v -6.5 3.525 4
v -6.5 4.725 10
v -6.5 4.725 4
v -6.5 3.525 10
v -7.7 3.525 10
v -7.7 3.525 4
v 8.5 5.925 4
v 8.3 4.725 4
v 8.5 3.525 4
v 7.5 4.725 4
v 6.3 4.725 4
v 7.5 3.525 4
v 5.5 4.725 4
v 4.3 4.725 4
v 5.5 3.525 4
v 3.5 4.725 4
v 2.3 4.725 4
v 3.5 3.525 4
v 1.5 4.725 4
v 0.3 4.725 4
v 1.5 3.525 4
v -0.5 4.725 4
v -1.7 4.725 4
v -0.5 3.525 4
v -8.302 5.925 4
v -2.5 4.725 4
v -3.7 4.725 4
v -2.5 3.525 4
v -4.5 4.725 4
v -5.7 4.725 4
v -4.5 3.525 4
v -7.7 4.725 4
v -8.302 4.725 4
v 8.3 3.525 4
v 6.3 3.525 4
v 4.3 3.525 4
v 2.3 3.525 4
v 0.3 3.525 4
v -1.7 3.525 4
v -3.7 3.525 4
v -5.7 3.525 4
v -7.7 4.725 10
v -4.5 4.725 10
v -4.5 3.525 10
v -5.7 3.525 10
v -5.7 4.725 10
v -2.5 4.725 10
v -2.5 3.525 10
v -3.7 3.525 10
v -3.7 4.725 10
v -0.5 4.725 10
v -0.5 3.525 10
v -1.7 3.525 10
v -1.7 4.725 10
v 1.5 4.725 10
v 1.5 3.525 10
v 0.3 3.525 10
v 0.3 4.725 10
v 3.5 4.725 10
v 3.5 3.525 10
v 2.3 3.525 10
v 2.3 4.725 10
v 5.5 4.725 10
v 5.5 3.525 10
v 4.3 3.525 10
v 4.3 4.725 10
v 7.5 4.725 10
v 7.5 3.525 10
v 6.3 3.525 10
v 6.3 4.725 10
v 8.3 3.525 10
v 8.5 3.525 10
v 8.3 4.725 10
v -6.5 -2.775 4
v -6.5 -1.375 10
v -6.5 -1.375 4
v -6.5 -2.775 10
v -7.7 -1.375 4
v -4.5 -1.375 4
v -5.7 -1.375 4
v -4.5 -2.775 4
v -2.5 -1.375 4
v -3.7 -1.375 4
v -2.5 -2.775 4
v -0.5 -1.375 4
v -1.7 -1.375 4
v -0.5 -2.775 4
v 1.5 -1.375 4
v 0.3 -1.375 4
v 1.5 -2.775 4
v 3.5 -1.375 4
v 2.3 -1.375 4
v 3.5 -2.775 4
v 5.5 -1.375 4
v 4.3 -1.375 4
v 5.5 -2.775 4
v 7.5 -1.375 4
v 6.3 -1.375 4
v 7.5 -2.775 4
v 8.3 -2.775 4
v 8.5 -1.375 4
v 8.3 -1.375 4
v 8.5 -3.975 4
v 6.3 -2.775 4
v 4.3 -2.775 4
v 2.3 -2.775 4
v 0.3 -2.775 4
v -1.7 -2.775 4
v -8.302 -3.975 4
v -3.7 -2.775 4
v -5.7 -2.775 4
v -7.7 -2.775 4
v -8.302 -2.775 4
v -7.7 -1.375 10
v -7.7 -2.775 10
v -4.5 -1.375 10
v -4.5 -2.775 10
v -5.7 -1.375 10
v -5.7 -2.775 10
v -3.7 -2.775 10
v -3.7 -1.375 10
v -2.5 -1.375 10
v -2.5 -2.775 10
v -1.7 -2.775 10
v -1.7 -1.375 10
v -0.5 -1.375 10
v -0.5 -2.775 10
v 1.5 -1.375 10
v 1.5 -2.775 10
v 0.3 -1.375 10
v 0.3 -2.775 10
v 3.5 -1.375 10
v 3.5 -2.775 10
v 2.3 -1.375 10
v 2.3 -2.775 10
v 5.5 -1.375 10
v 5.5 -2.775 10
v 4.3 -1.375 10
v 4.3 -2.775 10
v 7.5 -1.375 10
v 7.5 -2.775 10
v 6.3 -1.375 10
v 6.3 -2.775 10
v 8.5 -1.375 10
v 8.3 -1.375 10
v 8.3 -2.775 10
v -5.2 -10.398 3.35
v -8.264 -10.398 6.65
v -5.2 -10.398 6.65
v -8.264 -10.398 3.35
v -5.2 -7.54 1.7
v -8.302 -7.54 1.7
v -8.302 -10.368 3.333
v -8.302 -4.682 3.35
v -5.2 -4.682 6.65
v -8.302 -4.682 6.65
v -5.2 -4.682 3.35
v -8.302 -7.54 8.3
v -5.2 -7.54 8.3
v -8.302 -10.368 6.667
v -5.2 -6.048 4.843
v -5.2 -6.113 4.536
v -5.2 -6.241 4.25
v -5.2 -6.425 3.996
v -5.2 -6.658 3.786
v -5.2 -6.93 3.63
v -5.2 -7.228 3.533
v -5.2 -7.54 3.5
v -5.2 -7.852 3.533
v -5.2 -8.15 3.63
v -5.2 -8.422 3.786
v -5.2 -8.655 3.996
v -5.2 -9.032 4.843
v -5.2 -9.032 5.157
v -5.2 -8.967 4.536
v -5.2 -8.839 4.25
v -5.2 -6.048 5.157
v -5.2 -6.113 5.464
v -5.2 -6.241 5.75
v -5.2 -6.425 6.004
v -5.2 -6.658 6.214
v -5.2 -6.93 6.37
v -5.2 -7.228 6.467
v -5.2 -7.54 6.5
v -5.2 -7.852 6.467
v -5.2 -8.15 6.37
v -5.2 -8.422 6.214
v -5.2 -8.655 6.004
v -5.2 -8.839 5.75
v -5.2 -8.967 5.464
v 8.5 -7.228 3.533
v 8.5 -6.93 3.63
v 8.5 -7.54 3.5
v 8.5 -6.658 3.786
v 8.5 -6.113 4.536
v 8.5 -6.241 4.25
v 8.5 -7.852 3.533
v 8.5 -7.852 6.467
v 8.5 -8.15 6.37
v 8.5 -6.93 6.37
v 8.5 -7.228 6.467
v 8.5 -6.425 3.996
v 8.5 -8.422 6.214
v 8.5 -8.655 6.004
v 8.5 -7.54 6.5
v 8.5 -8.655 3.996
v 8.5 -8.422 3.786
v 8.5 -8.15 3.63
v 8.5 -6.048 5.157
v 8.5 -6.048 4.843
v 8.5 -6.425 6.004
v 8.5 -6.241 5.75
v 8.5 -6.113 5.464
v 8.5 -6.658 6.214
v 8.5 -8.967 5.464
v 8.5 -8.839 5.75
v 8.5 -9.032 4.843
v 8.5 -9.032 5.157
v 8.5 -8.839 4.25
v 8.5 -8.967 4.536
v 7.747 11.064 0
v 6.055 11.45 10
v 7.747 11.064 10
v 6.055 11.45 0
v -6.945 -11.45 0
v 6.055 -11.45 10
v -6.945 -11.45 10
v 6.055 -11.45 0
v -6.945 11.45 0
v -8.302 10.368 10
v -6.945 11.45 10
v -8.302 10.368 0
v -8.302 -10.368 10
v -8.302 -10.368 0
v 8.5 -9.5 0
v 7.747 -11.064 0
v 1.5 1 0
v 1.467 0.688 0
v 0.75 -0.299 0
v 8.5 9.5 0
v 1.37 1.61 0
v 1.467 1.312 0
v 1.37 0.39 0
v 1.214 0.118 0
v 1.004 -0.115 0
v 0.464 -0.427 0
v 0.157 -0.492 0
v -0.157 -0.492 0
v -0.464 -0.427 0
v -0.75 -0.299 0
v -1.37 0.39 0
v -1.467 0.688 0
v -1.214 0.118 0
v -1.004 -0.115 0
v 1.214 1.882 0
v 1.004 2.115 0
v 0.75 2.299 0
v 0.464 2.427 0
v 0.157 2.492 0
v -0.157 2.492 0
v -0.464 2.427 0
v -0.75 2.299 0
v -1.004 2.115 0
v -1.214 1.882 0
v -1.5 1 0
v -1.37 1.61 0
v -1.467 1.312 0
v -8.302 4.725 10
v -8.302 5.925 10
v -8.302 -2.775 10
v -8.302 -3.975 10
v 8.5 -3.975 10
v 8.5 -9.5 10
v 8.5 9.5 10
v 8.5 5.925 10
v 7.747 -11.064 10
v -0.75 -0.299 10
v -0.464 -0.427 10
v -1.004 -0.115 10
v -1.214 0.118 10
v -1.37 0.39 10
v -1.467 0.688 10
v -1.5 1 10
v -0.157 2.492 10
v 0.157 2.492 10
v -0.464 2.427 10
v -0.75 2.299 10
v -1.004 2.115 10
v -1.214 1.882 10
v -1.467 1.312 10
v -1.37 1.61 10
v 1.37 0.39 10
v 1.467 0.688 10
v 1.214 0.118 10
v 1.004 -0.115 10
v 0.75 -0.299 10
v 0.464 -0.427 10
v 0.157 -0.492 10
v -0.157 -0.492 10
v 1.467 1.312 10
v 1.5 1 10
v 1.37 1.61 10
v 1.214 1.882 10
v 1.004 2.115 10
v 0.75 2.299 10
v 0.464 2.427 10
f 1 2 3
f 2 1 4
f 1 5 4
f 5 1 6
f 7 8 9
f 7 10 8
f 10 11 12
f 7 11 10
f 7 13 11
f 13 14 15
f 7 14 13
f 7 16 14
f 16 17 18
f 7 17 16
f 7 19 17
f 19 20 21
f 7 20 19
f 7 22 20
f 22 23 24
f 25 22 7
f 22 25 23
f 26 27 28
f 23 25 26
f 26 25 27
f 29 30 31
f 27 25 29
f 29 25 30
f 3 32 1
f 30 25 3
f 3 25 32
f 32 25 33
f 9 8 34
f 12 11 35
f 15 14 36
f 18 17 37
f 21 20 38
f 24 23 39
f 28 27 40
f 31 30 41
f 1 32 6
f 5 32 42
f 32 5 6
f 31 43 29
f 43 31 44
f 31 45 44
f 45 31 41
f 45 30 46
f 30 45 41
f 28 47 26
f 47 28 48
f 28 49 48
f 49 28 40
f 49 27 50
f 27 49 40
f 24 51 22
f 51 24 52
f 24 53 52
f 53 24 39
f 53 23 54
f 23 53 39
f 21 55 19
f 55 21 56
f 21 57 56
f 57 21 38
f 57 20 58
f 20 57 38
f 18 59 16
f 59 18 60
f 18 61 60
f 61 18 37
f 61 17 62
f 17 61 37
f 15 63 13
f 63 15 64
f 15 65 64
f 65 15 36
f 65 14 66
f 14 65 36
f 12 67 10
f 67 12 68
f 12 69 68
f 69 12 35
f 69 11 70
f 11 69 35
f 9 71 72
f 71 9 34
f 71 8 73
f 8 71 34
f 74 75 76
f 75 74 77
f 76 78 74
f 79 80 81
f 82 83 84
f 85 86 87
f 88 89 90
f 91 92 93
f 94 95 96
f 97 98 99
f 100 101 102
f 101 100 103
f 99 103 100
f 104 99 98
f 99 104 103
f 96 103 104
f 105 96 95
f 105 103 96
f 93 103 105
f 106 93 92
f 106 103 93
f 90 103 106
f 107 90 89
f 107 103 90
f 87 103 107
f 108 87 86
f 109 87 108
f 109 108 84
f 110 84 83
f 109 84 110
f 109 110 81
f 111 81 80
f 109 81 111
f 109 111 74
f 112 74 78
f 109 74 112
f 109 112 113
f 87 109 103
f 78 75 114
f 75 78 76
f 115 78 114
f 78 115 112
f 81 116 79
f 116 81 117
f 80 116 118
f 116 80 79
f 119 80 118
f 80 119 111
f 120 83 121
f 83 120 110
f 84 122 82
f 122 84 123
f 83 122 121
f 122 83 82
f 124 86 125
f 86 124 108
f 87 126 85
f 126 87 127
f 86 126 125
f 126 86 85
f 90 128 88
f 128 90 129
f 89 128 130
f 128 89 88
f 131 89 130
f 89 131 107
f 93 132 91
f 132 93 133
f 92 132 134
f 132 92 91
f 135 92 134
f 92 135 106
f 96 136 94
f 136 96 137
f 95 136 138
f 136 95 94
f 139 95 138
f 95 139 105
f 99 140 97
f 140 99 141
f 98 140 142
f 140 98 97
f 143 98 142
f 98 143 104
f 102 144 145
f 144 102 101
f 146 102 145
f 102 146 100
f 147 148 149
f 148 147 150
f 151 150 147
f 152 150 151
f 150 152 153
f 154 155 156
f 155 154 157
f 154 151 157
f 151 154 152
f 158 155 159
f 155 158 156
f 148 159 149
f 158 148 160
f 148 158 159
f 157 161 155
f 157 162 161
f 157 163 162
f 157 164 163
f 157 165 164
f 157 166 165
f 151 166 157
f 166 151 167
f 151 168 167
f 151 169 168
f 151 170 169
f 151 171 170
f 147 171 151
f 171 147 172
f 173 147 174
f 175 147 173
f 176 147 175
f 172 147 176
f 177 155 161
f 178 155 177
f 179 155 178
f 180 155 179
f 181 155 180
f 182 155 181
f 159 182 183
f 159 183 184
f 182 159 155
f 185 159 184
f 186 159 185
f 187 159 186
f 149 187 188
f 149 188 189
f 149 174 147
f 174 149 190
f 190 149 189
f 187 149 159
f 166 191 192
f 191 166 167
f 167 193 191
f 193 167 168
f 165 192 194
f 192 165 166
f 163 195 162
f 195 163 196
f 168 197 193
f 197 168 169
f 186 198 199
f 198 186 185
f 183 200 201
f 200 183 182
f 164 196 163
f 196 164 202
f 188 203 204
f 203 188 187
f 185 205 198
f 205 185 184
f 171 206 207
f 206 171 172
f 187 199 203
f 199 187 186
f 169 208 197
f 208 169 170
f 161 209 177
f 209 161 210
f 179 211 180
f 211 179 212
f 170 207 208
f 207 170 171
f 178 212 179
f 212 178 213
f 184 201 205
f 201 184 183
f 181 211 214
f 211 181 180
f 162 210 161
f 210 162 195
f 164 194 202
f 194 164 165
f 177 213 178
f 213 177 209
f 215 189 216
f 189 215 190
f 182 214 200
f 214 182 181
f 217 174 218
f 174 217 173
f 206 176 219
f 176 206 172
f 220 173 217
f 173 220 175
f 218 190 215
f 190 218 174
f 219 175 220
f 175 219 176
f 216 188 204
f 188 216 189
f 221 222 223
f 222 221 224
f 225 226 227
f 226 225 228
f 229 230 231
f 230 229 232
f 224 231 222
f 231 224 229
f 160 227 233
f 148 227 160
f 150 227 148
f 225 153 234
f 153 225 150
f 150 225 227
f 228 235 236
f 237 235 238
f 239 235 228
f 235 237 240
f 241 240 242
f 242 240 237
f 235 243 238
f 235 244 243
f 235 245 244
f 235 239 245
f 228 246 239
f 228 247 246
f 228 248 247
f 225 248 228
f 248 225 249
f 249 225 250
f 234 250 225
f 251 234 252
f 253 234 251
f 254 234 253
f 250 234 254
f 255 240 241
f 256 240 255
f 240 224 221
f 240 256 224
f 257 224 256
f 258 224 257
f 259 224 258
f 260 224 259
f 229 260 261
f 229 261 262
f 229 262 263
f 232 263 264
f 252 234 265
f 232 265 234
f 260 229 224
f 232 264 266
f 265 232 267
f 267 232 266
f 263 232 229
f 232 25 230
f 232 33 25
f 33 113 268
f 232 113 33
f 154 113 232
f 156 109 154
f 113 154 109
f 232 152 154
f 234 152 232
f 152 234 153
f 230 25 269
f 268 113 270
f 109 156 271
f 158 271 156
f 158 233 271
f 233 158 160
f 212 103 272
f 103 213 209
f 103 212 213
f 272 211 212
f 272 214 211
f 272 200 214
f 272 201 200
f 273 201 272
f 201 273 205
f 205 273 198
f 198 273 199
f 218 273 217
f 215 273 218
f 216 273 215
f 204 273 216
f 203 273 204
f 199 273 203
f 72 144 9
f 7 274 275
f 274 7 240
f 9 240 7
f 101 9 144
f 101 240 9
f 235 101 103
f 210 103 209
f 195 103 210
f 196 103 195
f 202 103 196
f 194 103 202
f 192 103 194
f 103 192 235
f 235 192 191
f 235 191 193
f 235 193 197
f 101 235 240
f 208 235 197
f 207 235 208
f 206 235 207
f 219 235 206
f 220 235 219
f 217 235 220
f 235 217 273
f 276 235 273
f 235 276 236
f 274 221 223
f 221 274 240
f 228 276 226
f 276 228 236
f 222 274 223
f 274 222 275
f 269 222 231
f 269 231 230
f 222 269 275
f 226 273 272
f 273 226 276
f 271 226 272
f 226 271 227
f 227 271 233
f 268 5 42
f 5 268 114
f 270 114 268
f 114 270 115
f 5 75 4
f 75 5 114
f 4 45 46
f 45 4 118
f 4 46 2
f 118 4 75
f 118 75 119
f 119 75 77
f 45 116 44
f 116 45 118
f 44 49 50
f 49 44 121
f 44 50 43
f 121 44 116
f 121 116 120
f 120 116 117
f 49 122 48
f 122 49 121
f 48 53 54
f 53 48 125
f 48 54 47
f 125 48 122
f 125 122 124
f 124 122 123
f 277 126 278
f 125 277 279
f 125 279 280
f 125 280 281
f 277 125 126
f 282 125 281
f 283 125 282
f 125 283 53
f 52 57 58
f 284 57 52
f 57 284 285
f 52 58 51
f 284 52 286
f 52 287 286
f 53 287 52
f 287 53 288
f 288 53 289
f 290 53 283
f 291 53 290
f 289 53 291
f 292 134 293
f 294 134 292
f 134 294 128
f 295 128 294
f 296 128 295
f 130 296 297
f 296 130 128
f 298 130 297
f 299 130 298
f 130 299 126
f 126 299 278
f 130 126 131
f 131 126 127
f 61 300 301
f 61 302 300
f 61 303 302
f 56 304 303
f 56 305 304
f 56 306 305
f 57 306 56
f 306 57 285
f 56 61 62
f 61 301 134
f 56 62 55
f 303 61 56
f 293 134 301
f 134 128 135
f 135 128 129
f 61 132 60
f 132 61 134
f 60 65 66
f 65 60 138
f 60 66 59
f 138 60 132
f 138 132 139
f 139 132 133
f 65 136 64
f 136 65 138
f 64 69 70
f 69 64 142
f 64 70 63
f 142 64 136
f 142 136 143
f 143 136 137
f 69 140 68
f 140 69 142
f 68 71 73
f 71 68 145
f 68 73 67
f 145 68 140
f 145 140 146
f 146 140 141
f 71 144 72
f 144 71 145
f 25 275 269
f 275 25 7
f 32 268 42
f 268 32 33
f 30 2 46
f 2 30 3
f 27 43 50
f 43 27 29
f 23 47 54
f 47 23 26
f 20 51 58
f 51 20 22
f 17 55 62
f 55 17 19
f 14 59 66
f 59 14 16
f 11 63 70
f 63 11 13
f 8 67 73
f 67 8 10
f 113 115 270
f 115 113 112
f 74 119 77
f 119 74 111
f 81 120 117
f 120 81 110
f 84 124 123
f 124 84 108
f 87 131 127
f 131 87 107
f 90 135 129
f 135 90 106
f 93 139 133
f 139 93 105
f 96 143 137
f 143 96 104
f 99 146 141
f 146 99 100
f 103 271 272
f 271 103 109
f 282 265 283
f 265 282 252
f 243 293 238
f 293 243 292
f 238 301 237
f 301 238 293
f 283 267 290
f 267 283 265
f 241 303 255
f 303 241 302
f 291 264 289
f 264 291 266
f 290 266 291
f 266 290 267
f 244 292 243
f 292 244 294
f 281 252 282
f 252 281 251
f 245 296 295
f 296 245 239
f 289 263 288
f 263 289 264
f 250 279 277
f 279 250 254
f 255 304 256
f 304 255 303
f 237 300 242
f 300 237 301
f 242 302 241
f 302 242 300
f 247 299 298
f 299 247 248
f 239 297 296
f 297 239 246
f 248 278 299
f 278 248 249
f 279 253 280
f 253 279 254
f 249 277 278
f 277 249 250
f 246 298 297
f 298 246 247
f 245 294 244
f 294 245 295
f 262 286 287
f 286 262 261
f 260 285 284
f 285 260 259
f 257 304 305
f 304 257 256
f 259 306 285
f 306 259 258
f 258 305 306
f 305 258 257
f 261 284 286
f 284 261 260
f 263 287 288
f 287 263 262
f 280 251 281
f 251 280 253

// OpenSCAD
// Graber i3 xy belt holder v1.0 by ValterFC
// december / 2013

// x axis not yet - sorry

// ******************************************************
// Select your belt type *NOT TESTED*
// ******************************************************
//T2.5
//belt_tooth_distance = 2.5;
//belt_tooth_ratio = 0.8;

//T5 (strongly discouraged)
//belt_tooth_distance = 5;
//belt_tooth_ratio = 1.05;

//HTD3
//belt_tooth_distance = 3;
//belt_tooth_ratio = 1.05;

//MXL
//belt_tooth_distance = 2.032;
//belt_tooth_ratio = 0.94;

//GT2
belt_tooth_distance = 2; // [2.5:T2.5, 5:T5, 3:HTD3, 2.032:MXL, 2:GT2]
belt_tooth_ratio = 0.8; // [0.8:T2.5, 1.05:T5, 1.05:HTD3, 0.94:MXL, 0.8:GT2]

//what file to generate?
make_object = 0; // [0:fixed object, 1:tensiometer object]

//side nut orientation
side_nut_orientation = 0; // [0:normal, 1:another way]

/*Non customizer variables*/
length = 17+0;
width = 10+0;
thickness = 21+0;
extra = 0.2+0;
belt_width = 6+0;
belt_thickness = 1.2+0; // Excluding teeth height (0.9)
belt_pitch = belt_tooth_distance+0;
teeth_height = 1.1+0;
teeth_width = belt_tooth_ratio+0;
screw_hole_diameter = 3+0;
nut_diameter = 5+0.8;
nut_thickness = 2.5+0;

// from thingiverse.com/thing:9347
module roundedRect(size, radius)
{
	x = size[0]-radius;
	y = size[1];
	z = size[2];
	linear_extrude(height=z)
	hull()
	{
		// place 4 circles in the corners, with the given radius
  		translate([(-x/2)+(radius/2), (-y/2)+(radius/2), 0])
			circle(r=radius);

		translate([(x/2)-(radius/2), (-y/2)+(radius/2), 0])
			circle(r=radius);

		translate([(-x/2)+(radius/2), (y/2)-(radius/2), 0])
			circle(r=radius);

		translate([(x/2)-(radius/2), (y/2)-(radius/2), 0])
			circle(r=radius);
	}
}

module sidenut() {
	//nut fitting
	if (make_object == 0) cylinder( h=nut_thickness+0.8,r=nut_diameter/2+extra*2,$fn=6 );
	//the screw cylinder
	cylinder( h=thickness+1, r=screw_hole_diameter/2, $fn=30);
}

difference()
{
	roundedRect([length,thickness,width], 2);

	//+++++++++++++++++++++++++++++++++++++++
	// belt top
	translate([-length/2,((thickness+belt_thickness+teeth_height)/4)-teeth_height,width-belt_width])
		cube([length,belt_thickness,belt_width+1]);

	// tooth top
	for( x = [0:belt_pitch:length+1] )
	{
		translate([x-length/2,((thickness+belt_thickness+teeth_height)/4),width-belt_width])
   		rotate(a=180,v=[0,0,1])
			cube(size=[belt_pitch-teeth_width,teeth_height+belt_thickness,belt_width+1], center=false);
	}
	//+++++++++++++++++++++++++++++++++++++++


	//+++++++++++++++++++++++++++++++++++++++
	// belt button
	translate([-length/2,((thickness+belt_thickness+teeth_height)/4)-(teeth_height+8.7),width-belt_width])
		cube([length,belt_thickness,belt_width+1]);

	// tooth button
	for( x = [0:belt_pitch:length+1] )
	{
		translate([x-length/2,((thickness+belt_thickness+teeth_height)/4)-7.2,width-belt_width])
   		rotate(a=180,v=[0,0,1])
			cube(size=[belt_pitch-teeth_width,teeth_height+belt_thickness,belt_width+1], center=false);
	}
	//+++++++++++++++++++++++++++++++++++++++

	// top nut
	if (make_object == 1)
	{
		translate([-3.0,1,width+1]) rotate([180,0,0])
			cylinder( h=width+2,r=screw_hole_diameter/2,$fn=30);

		translate([0,1,0]) rotate([180,0,0])
		cube(size=[width-4,screw_hole_diameter,30], center=true);

		translate([+3.0,1,width+1]) rotate([180,0,0])
			cylinder( h=width+2,r=screw_hole_diameter/2,$fn=30);
	}

	translate([0,1,width+1]) rotate([180,0,0])
		cylinder( h=width+2, r=screw_hole_diameter/2, $fn=30);

	// side nut
	if (side_nut_orientation == 0)
	{
		translate([-length/2,-nut_diameter*1.3,width/2]) rotate([0,-270,0]) //original way
			sidenut();
	} else {
		translate([-length/2,-nut_diameter*1.42,width/2]) rotate([0,-270,0]) rotate([0,0,90]) //another way
			sidenut();
	}
}
